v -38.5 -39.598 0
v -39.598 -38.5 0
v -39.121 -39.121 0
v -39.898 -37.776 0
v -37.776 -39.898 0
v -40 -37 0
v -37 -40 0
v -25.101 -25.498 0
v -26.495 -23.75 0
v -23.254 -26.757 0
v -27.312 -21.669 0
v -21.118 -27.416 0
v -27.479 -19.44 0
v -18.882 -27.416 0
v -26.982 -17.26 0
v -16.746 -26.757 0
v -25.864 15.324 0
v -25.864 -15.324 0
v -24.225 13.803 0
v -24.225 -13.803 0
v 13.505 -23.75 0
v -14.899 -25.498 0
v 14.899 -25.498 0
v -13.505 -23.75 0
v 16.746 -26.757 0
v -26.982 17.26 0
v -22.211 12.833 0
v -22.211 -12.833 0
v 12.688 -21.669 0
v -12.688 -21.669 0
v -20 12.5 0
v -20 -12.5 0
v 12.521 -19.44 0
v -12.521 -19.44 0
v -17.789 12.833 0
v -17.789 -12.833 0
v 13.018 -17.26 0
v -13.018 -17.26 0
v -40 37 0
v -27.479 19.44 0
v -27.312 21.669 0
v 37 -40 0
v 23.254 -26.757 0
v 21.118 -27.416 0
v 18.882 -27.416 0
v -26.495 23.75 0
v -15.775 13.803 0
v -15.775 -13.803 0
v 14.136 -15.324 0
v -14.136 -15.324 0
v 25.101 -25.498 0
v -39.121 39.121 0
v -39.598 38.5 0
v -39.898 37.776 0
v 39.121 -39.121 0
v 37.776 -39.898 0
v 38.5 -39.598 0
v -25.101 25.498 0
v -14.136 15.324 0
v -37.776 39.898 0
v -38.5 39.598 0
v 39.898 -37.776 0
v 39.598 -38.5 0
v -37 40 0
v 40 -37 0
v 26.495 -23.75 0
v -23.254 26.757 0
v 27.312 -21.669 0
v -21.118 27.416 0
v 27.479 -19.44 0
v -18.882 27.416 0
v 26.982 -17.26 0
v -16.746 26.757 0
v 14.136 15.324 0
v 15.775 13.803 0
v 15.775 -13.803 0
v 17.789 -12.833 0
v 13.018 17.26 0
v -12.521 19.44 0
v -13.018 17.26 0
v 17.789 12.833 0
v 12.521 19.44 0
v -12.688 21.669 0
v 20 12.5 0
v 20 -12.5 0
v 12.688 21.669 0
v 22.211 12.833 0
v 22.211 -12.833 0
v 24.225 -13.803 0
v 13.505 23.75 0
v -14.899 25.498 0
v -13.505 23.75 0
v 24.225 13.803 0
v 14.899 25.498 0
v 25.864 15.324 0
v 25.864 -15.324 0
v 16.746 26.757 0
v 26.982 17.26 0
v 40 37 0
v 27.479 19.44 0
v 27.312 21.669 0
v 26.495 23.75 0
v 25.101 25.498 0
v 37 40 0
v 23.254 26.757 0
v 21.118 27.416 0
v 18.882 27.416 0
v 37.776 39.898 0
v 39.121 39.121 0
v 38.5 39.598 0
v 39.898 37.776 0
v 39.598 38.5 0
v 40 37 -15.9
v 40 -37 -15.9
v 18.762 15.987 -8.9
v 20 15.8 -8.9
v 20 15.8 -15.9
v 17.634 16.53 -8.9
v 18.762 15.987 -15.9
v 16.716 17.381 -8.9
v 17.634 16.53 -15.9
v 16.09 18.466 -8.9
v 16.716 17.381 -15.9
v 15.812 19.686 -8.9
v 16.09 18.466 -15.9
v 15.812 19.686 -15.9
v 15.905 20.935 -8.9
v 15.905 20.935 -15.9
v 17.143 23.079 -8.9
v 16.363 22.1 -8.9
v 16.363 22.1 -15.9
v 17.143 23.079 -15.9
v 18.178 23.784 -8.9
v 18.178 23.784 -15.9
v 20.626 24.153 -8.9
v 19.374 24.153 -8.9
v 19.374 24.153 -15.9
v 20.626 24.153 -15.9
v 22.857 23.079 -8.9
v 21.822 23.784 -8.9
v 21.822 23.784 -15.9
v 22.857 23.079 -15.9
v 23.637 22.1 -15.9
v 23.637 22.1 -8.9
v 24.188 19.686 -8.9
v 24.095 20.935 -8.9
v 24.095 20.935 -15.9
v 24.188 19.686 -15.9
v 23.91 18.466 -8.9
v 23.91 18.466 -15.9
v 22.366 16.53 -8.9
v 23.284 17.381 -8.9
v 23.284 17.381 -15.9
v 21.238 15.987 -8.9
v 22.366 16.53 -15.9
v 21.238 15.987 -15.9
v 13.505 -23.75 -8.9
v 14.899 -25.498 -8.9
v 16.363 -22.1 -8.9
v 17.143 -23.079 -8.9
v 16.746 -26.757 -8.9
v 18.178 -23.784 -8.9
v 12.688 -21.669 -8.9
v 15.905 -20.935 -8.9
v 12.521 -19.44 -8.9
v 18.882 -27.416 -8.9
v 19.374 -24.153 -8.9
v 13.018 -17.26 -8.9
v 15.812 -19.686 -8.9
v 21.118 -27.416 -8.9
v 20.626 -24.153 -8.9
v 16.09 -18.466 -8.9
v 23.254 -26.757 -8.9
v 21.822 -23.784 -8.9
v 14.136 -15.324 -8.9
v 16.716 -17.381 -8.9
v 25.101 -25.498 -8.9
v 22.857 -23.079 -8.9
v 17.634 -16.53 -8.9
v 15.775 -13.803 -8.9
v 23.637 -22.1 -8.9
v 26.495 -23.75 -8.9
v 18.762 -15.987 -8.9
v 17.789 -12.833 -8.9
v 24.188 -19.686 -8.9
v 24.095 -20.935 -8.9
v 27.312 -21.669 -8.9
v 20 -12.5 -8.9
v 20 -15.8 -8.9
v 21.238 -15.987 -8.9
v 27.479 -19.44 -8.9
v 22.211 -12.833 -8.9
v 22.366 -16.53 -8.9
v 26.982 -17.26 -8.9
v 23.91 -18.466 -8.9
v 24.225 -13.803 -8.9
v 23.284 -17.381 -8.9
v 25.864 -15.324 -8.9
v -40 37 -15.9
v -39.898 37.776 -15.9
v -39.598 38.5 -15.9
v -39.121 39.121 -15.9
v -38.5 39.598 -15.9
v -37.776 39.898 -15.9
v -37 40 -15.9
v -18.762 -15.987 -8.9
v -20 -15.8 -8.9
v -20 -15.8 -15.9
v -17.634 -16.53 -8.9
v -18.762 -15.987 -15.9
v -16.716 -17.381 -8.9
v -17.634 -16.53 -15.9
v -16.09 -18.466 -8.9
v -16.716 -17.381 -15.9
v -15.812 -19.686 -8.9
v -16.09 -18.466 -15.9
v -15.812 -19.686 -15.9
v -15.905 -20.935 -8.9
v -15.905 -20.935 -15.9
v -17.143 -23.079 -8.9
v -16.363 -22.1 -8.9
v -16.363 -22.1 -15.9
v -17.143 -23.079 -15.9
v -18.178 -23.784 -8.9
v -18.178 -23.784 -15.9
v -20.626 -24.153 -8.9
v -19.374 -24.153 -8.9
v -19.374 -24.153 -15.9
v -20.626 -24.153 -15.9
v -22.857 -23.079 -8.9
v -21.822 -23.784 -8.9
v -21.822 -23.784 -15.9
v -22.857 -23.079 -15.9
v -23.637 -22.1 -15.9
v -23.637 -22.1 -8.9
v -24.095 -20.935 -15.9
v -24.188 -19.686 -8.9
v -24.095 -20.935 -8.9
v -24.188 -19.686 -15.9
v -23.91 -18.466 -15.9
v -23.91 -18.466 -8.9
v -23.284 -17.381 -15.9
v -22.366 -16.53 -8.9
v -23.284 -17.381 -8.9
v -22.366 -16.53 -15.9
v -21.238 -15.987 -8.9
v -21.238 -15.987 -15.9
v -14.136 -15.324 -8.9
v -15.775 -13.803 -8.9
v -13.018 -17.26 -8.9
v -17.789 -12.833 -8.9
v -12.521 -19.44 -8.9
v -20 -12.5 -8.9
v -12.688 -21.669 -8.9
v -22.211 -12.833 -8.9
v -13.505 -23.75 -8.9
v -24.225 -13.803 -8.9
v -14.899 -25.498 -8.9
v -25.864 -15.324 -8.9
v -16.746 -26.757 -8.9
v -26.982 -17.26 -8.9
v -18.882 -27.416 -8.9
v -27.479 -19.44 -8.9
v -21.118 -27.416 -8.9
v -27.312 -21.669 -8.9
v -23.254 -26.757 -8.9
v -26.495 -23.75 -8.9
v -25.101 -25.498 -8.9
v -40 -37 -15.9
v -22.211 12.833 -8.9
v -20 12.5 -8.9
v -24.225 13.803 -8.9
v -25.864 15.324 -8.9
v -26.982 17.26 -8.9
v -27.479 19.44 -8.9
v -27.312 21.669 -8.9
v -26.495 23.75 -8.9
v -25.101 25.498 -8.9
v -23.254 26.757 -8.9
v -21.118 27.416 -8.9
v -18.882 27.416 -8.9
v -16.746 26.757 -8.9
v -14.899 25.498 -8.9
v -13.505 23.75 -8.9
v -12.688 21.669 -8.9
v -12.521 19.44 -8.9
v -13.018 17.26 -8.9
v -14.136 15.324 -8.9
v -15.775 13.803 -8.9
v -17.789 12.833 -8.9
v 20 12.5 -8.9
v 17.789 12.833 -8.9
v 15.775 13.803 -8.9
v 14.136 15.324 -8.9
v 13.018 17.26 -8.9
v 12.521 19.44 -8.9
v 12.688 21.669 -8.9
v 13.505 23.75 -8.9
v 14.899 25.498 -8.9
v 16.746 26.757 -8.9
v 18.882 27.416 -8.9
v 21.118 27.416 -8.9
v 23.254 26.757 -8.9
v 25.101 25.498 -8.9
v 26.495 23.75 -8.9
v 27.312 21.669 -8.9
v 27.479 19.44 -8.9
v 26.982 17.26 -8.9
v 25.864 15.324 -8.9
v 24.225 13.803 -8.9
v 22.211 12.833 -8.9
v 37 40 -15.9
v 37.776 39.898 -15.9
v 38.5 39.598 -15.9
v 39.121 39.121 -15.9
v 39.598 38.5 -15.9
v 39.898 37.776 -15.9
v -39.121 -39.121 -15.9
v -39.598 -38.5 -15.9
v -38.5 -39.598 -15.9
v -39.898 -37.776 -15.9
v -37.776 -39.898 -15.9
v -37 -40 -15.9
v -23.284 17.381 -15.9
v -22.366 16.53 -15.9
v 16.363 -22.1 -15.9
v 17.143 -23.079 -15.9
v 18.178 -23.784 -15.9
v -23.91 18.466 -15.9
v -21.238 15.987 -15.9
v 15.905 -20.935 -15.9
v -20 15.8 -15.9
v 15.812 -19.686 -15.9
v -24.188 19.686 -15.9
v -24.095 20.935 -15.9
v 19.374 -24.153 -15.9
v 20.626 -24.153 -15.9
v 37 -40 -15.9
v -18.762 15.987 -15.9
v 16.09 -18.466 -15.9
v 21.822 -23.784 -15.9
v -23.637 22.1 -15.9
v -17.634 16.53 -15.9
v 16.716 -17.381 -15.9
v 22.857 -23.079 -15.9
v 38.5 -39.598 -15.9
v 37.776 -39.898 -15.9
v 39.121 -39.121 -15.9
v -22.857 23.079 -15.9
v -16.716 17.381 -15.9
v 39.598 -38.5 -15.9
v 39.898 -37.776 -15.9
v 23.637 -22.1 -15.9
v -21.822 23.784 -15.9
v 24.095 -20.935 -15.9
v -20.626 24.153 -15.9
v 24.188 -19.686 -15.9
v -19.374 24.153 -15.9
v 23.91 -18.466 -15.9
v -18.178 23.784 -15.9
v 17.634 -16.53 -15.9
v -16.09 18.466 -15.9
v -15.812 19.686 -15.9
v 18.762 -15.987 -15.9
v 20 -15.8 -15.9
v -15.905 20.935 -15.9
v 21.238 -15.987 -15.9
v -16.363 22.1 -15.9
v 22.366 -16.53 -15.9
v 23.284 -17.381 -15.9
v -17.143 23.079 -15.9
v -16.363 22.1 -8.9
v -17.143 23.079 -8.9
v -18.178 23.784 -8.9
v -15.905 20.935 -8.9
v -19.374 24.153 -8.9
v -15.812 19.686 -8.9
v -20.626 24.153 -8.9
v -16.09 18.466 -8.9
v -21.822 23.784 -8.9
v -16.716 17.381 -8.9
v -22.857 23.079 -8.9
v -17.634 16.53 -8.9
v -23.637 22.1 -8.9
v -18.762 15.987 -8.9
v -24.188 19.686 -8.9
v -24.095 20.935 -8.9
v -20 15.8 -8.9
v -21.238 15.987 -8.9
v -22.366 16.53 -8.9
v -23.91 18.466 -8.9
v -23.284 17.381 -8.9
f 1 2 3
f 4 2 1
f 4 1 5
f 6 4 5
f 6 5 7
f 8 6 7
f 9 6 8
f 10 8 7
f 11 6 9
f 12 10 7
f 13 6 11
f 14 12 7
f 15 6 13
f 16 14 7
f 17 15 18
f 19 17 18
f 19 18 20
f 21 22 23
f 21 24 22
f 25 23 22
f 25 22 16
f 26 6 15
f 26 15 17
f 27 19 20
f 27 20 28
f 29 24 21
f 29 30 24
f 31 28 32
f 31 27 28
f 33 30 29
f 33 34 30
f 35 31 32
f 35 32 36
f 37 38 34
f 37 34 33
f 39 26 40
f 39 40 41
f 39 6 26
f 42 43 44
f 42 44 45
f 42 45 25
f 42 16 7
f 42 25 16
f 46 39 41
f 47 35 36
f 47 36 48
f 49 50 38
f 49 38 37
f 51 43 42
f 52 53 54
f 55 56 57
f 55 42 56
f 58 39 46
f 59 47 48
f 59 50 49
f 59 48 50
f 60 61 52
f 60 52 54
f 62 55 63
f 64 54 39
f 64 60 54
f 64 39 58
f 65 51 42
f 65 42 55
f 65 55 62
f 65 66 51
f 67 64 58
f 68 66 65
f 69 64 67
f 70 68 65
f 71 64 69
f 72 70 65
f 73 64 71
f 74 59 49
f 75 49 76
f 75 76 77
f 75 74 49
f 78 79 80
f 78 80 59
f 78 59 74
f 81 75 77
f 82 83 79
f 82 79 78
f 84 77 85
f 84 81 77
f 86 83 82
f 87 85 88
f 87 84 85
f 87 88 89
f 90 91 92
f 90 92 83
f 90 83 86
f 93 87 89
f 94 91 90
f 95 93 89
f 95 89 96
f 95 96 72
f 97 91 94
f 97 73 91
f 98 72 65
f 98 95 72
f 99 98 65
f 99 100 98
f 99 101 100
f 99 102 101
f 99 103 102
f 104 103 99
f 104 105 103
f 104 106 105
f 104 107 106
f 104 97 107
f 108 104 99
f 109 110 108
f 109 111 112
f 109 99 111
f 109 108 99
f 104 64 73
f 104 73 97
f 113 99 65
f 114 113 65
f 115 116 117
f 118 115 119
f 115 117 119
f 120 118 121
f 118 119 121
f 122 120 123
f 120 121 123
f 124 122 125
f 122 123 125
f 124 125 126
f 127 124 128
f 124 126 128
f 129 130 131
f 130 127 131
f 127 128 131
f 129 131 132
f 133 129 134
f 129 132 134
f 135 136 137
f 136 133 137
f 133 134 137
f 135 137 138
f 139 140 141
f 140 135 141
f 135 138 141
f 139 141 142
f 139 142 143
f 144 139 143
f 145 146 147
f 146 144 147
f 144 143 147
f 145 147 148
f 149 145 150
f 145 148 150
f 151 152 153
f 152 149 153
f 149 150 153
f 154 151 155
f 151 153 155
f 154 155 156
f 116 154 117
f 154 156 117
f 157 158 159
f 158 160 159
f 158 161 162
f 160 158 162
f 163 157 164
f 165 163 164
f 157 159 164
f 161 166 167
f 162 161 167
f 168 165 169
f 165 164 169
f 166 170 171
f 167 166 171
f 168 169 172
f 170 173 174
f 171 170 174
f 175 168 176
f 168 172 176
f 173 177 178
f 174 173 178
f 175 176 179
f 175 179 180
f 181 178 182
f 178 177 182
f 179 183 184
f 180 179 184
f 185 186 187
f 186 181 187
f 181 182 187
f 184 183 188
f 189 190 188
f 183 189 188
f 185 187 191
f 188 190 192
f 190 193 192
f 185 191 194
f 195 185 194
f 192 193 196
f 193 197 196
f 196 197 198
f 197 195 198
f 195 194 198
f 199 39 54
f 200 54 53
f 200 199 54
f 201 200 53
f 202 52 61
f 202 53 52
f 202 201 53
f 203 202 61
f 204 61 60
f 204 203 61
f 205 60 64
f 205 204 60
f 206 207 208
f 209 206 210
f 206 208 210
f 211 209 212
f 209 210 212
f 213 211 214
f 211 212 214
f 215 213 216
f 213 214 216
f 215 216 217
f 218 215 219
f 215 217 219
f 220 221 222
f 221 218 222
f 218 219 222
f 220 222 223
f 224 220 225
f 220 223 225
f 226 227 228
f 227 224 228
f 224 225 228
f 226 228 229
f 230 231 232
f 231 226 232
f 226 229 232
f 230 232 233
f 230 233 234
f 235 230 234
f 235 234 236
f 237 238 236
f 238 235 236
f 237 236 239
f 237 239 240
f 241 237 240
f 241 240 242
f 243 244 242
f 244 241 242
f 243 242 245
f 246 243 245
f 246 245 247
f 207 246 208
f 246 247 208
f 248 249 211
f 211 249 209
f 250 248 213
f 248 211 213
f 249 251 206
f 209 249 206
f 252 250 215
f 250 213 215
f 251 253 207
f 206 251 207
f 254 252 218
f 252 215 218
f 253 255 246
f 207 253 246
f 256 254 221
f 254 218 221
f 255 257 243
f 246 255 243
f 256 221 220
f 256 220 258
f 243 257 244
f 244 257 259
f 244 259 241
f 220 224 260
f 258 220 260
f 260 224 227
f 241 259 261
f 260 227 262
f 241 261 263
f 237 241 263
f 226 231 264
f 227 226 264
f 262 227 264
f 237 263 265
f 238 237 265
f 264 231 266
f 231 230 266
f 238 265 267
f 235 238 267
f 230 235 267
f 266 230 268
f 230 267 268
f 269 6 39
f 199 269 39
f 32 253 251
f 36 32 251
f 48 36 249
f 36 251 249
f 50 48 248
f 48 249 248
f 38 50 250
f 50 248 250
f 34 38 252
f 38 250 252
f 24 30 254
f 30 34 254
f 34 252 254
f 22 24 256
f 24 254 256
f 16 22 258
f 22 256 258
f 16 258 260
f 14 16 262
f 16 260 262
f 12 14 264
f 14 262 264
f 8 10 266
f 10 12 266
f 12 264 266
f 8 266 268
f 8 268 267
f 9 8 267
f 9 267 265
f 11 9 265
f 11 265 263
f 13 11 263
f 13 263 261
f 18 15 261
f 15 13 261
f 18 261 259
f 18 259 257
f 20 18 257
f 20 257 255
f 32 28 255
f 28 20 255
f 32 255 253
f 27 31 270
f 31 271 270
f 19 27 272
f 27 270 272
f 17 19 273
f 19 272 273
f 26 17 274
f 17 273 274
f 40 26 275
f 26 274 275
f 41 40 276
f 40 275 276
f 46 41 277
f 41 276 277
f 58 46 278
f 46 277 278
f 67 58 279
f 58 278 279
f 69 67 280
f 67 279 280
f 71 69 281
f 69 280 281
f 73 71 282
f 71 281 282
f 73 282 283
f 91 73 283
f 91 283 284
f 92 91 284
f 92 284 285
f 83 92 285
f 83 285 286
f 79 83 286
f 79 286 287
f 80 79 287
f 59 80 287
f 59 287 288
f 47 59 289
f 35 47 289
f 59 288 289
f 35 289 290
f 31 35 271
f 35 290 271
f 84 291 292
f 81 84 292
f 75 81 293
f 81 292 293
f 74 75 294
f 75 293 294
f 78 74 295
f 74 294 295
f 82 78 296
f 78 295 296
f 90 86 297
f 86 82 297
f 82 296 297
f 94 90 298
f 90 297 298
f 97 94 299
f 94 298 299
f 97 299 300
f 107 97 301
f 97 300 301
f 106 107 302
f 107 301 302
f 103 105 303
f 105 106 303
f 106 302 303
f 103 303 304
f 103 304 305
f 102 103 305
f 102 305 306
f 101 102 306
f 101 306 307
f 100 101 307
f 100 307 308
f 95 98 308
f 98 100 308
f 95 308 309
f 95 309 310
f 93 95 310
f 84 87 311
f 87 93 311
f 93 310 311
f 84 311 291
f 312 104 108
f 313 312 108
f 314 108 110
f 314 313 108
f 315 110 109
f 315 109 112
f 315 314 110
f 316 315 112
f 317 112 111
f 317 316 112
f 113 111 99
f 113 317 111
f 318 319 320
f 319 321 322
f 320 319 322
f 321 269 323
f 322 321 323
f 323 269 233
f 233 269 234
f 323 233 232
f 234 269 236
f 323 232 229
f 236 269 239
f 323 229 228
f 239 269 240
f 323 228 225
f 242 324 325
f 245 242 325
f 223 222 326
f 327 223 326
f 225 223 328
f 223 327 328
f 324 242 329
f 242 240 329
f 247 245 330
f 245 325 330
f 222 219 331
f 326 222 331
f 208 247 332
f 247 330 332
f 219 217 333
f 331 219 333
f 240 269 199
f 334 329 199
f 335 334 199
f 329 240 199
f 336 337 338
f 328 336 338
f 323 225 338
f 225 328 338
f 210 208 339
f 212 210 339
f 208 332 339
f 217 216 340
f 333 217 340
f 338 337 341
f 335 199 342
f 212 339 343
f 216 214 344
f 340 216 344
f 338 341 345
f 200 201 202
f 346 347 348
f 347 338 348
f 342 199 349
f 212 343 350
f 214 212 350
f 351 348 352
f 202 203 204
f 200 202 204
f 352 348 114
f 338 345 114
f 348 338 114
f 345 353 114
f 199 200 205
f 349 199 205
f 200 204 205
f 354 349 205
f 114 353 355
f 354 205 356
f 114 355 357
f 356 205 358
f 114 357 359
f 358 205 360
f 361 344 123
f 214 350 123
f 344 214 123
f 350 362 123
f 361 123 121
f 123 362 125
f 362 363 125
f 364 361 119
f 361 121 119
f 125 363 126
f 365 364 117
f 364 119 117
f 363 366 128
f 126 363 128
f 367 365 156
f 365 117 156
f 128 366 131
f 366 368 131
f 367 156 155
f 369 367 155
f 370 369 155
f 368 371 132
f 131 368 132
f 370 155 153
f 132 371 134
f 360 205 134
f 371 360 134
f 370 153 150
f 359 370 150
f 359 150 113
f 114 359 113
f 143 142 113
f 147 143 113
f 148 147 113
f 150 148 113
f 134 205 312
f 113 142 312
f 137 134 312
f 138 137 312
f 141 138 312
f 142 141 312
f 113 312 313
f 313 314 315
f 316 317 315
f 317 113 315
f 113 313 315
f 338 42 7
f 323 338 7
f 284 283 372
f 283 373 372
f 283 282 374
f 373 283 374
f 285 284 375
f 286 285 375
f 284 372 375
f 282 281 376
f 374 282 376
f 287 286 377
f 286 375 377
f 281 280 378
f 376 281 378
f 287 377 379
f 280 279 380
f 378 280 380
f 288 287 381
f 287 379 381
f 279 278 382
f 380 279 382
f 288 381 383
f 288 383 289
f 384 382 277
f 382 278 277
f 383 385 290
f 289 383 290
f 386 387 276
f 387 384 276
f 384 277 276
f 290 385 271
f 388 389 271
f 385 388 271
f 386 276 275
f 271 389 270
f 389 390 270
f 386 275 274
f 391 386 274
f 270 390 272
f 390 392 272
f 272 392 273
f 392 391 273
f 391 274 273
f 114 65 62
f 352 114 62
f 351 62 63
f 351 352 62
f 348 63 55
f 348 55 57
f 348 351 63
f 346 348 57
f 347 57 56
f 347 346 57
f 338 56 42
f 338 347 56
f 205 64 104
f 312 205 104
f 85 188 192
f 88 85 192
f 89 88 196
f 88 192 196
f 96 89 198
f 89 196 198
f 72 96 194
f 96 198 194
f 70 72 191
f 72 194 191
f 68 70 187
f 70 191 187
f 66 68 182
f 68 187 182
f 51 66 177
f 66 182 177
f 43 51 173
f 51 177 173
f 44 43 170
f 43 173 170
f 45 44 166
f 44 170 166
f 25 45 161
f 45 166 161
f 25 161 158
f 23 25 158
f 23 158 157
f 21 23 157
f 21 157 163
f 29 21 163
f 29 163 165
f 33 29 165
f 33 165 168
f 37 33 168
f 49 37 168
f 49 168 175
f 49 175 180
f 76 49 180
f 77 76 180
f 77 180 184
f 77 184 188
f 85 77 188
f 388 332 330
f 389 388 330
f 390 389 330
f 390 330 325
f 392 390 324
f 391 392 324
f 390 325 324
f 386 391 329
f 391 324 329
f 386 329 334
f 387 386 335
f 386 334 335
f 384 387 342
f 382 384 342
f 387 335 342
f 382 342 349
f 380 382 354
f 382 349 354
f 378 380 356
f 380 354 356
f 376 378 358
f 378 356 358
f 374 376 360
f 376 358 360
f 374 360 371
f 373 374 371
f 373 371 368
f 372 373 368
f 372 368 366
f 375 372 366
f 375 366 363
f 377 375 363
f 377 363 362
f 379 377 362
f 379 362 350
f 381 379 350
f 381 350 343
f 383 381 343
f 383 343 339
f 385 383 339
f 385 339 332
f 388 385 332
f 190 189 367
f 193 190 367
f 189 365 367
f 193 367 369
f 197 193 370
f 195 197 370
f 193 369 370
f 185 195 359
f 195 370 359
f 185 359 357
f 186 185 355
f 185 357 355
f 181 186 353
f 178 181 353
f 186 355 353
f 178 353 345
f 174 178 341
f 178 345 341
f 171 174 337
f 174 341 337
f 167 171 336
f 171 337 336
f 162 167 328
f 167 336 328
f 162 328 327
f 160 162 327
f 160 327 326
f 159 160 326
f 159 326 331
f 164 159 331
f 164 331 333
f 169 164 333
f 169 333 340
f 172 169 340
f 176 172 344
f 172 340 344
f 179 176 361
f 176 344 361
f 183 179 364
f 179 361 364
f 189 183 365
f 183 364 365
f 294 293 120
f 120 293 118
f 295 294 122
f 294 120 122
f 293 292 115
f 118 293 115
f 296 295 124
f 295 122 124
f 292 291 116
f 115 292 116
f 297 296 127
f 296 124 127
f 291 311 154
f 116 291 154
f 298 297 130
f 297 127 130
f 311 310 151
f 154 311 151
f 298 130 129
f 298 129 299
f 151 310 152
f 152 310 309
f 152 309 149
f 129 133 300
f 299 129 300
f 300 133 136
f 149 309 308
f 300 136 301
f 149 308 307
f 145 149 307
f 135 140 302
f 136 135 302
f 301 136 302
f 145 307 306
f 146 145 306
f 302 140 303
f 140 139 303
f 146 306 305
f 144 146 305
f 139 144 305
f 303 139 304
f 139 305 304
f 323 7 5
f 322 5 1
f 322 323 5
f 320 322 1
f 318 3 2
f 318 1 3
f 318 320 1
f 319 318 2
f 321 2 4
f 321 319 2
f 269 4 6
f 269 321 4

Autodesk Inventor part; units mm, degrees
ref_plane "YZ Plane" through (0, 0, 0) normal (1, 0, 0) x (0, 1, 0)
ref_plane "XZ Plane" through (0, 0, 0) normal (0, 1, 0) x (-1, 0, 0)
ref_plane "XY Plane" through (0, 0, 0) normal (0, 0, 1) x (1, 0, 0)
sketch "Sketch1" plane through (0, 0, 0) normal (0, 0, 1) x (1, 0, 0)
  line L0 (-40, 40) -> (40, 40)
  line L1 (40, 40) -> (40, -40)
  line L2 (40, -40) -> (-40, -40)
  line L3 (-40, -40) -> (-40, 40)
  point P0 (0, 0)
  dimension "d0" = 80
  dimension "d1" = 80
  dimension "d2" = 40
  dimension "d3" = 40
extrude "Extrusion1" add sketch "Sketch1" against normal blind 15.9
sketch "Sketch2" plane through (0, 0, 0) normal (0, 0, 1) x (1, 0, 0)
  line L0 (0, 56) -> (0, -56) projected
  line L1 (-56, 0) -> (56, 0) projected
  point P0 (-20, 20)
  dimension "d6" = 20
  dimension "d7" = 20
hole "Hole1" at (-20, 20, 0) direction (0, 0, -1) diameter 8.4 end through all counterbore diameter 15 counterbore depth 8.9 clearance for "Socket Head Cap Screw" size "M8" standard "Ansi Metric M Profile"
mirror "Mirror1" about plane through (0, 0, 0) normal (1, 0, 0) of "Hole1"
mirror "Mirror2" about plane through (0, 0, 0) normal (0, 1, 0) of "Hole1", "Mirror1"
fillet "Fillet1" radius 3 4 edges at (-40, -40, -7.95) (-40, 40, -7.95) (40, 40, -7.95) (40, -40, -7.95)
equation "\"d2\" = 0.5 * d0"
equation "\"d3\" = d2"
equation "\"d7\" = d6"
properties part number "21-8000Z1" material "Aluminum-6061"
